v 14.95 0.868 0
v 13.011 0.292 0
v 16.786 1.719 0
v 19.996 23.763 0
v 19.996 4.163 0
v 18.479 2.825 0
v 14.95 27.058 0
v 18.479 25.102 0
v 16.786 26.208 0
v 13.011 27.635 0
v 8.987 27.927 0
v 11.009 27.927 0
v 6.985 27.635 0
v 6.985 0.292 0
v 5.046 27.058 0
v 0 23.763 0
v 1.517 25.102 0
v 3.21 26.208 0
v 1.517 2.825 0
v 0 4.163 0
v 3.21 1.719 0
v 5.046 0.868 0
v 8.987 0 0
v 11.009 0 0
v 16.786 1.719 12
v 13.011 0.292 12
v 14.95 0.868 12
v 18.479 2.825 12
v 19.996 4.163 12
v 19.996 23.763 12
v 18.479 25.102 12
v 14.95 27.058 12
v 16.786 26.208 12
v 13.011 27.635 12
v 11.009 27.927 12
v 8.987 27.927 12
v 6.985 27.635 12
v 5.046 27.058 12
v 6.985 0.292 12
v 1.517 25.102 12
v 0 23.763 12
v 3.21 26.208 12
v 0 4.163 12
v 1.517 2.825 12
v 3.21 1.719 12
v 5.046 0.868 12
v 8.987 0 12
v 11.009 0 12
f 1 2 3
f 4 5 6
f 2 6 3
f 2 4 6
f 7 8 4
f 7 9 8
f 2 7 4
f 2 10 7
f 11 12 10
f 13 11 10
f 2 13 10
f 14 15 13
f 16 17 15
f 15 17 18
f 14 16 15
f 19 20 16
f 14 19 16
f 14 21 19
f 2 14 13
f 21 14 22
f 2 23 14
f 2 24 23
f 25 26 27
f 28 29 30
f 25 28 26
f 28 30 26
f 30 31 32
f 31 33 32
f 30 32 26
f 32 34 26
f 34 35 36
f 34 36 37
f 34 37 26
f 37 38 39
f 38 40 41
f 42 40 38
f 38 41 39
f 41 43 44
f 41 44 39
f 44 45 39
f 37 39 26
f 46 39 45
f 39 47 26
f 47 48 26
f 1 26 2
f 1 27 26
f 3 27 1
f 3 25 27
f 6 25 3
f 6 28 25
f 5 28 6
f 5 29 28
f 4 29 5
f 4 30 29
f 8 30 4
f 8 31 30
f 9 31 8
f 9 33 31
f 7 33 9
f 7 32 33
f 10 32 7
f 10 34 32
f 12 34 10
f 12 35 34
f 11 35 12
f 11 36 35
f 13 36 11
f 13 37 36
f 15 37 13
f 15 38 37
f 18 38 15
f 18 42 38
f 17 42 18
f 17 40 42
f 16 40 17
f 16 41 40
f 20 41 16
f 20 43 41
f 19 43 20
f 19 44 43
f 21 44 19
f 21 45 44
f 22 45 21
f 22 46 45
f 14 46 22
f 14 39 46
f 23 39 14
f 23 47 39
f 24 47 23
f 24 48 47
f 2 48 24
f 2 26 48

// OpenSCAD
$fn = 32;

// ----------------------------------------------------------------------
// Eccentric disc: double_d, 12 mm thick
// ----------------------------------------------------------------------

// --- parameters (mm) ---
profile_height = 12;      // extrusion height
profile_points = 24;      // points of the closed outline

profile = [[19.996, 23.763], [18.479, 25.102], [16.786, 26.208], [14.95, 27.058], [13.011, 27.635], [11.009, 27.927], [8.987, 27.927], [6.985, 27.635], [5.046, 27.058], [3.21, 26.208], [1.517, 25.102], [0, 23.763], [0, 4.163], [1.517, 2.825], [3.21, 1.719], [5.046, 0.868], [6.985, 0.292], [8.987, 0], [11.009, 0], [13.011, 0.292], [14.95, 0.868], [16.786, 1.719], [18.479, 2.825], [19.996, 4.163]];  // single closed polygon, 24 points, counter clockwise

// --- the one profile operation ---
linear_extrude(height = profile_height) polygon(points = profile);
